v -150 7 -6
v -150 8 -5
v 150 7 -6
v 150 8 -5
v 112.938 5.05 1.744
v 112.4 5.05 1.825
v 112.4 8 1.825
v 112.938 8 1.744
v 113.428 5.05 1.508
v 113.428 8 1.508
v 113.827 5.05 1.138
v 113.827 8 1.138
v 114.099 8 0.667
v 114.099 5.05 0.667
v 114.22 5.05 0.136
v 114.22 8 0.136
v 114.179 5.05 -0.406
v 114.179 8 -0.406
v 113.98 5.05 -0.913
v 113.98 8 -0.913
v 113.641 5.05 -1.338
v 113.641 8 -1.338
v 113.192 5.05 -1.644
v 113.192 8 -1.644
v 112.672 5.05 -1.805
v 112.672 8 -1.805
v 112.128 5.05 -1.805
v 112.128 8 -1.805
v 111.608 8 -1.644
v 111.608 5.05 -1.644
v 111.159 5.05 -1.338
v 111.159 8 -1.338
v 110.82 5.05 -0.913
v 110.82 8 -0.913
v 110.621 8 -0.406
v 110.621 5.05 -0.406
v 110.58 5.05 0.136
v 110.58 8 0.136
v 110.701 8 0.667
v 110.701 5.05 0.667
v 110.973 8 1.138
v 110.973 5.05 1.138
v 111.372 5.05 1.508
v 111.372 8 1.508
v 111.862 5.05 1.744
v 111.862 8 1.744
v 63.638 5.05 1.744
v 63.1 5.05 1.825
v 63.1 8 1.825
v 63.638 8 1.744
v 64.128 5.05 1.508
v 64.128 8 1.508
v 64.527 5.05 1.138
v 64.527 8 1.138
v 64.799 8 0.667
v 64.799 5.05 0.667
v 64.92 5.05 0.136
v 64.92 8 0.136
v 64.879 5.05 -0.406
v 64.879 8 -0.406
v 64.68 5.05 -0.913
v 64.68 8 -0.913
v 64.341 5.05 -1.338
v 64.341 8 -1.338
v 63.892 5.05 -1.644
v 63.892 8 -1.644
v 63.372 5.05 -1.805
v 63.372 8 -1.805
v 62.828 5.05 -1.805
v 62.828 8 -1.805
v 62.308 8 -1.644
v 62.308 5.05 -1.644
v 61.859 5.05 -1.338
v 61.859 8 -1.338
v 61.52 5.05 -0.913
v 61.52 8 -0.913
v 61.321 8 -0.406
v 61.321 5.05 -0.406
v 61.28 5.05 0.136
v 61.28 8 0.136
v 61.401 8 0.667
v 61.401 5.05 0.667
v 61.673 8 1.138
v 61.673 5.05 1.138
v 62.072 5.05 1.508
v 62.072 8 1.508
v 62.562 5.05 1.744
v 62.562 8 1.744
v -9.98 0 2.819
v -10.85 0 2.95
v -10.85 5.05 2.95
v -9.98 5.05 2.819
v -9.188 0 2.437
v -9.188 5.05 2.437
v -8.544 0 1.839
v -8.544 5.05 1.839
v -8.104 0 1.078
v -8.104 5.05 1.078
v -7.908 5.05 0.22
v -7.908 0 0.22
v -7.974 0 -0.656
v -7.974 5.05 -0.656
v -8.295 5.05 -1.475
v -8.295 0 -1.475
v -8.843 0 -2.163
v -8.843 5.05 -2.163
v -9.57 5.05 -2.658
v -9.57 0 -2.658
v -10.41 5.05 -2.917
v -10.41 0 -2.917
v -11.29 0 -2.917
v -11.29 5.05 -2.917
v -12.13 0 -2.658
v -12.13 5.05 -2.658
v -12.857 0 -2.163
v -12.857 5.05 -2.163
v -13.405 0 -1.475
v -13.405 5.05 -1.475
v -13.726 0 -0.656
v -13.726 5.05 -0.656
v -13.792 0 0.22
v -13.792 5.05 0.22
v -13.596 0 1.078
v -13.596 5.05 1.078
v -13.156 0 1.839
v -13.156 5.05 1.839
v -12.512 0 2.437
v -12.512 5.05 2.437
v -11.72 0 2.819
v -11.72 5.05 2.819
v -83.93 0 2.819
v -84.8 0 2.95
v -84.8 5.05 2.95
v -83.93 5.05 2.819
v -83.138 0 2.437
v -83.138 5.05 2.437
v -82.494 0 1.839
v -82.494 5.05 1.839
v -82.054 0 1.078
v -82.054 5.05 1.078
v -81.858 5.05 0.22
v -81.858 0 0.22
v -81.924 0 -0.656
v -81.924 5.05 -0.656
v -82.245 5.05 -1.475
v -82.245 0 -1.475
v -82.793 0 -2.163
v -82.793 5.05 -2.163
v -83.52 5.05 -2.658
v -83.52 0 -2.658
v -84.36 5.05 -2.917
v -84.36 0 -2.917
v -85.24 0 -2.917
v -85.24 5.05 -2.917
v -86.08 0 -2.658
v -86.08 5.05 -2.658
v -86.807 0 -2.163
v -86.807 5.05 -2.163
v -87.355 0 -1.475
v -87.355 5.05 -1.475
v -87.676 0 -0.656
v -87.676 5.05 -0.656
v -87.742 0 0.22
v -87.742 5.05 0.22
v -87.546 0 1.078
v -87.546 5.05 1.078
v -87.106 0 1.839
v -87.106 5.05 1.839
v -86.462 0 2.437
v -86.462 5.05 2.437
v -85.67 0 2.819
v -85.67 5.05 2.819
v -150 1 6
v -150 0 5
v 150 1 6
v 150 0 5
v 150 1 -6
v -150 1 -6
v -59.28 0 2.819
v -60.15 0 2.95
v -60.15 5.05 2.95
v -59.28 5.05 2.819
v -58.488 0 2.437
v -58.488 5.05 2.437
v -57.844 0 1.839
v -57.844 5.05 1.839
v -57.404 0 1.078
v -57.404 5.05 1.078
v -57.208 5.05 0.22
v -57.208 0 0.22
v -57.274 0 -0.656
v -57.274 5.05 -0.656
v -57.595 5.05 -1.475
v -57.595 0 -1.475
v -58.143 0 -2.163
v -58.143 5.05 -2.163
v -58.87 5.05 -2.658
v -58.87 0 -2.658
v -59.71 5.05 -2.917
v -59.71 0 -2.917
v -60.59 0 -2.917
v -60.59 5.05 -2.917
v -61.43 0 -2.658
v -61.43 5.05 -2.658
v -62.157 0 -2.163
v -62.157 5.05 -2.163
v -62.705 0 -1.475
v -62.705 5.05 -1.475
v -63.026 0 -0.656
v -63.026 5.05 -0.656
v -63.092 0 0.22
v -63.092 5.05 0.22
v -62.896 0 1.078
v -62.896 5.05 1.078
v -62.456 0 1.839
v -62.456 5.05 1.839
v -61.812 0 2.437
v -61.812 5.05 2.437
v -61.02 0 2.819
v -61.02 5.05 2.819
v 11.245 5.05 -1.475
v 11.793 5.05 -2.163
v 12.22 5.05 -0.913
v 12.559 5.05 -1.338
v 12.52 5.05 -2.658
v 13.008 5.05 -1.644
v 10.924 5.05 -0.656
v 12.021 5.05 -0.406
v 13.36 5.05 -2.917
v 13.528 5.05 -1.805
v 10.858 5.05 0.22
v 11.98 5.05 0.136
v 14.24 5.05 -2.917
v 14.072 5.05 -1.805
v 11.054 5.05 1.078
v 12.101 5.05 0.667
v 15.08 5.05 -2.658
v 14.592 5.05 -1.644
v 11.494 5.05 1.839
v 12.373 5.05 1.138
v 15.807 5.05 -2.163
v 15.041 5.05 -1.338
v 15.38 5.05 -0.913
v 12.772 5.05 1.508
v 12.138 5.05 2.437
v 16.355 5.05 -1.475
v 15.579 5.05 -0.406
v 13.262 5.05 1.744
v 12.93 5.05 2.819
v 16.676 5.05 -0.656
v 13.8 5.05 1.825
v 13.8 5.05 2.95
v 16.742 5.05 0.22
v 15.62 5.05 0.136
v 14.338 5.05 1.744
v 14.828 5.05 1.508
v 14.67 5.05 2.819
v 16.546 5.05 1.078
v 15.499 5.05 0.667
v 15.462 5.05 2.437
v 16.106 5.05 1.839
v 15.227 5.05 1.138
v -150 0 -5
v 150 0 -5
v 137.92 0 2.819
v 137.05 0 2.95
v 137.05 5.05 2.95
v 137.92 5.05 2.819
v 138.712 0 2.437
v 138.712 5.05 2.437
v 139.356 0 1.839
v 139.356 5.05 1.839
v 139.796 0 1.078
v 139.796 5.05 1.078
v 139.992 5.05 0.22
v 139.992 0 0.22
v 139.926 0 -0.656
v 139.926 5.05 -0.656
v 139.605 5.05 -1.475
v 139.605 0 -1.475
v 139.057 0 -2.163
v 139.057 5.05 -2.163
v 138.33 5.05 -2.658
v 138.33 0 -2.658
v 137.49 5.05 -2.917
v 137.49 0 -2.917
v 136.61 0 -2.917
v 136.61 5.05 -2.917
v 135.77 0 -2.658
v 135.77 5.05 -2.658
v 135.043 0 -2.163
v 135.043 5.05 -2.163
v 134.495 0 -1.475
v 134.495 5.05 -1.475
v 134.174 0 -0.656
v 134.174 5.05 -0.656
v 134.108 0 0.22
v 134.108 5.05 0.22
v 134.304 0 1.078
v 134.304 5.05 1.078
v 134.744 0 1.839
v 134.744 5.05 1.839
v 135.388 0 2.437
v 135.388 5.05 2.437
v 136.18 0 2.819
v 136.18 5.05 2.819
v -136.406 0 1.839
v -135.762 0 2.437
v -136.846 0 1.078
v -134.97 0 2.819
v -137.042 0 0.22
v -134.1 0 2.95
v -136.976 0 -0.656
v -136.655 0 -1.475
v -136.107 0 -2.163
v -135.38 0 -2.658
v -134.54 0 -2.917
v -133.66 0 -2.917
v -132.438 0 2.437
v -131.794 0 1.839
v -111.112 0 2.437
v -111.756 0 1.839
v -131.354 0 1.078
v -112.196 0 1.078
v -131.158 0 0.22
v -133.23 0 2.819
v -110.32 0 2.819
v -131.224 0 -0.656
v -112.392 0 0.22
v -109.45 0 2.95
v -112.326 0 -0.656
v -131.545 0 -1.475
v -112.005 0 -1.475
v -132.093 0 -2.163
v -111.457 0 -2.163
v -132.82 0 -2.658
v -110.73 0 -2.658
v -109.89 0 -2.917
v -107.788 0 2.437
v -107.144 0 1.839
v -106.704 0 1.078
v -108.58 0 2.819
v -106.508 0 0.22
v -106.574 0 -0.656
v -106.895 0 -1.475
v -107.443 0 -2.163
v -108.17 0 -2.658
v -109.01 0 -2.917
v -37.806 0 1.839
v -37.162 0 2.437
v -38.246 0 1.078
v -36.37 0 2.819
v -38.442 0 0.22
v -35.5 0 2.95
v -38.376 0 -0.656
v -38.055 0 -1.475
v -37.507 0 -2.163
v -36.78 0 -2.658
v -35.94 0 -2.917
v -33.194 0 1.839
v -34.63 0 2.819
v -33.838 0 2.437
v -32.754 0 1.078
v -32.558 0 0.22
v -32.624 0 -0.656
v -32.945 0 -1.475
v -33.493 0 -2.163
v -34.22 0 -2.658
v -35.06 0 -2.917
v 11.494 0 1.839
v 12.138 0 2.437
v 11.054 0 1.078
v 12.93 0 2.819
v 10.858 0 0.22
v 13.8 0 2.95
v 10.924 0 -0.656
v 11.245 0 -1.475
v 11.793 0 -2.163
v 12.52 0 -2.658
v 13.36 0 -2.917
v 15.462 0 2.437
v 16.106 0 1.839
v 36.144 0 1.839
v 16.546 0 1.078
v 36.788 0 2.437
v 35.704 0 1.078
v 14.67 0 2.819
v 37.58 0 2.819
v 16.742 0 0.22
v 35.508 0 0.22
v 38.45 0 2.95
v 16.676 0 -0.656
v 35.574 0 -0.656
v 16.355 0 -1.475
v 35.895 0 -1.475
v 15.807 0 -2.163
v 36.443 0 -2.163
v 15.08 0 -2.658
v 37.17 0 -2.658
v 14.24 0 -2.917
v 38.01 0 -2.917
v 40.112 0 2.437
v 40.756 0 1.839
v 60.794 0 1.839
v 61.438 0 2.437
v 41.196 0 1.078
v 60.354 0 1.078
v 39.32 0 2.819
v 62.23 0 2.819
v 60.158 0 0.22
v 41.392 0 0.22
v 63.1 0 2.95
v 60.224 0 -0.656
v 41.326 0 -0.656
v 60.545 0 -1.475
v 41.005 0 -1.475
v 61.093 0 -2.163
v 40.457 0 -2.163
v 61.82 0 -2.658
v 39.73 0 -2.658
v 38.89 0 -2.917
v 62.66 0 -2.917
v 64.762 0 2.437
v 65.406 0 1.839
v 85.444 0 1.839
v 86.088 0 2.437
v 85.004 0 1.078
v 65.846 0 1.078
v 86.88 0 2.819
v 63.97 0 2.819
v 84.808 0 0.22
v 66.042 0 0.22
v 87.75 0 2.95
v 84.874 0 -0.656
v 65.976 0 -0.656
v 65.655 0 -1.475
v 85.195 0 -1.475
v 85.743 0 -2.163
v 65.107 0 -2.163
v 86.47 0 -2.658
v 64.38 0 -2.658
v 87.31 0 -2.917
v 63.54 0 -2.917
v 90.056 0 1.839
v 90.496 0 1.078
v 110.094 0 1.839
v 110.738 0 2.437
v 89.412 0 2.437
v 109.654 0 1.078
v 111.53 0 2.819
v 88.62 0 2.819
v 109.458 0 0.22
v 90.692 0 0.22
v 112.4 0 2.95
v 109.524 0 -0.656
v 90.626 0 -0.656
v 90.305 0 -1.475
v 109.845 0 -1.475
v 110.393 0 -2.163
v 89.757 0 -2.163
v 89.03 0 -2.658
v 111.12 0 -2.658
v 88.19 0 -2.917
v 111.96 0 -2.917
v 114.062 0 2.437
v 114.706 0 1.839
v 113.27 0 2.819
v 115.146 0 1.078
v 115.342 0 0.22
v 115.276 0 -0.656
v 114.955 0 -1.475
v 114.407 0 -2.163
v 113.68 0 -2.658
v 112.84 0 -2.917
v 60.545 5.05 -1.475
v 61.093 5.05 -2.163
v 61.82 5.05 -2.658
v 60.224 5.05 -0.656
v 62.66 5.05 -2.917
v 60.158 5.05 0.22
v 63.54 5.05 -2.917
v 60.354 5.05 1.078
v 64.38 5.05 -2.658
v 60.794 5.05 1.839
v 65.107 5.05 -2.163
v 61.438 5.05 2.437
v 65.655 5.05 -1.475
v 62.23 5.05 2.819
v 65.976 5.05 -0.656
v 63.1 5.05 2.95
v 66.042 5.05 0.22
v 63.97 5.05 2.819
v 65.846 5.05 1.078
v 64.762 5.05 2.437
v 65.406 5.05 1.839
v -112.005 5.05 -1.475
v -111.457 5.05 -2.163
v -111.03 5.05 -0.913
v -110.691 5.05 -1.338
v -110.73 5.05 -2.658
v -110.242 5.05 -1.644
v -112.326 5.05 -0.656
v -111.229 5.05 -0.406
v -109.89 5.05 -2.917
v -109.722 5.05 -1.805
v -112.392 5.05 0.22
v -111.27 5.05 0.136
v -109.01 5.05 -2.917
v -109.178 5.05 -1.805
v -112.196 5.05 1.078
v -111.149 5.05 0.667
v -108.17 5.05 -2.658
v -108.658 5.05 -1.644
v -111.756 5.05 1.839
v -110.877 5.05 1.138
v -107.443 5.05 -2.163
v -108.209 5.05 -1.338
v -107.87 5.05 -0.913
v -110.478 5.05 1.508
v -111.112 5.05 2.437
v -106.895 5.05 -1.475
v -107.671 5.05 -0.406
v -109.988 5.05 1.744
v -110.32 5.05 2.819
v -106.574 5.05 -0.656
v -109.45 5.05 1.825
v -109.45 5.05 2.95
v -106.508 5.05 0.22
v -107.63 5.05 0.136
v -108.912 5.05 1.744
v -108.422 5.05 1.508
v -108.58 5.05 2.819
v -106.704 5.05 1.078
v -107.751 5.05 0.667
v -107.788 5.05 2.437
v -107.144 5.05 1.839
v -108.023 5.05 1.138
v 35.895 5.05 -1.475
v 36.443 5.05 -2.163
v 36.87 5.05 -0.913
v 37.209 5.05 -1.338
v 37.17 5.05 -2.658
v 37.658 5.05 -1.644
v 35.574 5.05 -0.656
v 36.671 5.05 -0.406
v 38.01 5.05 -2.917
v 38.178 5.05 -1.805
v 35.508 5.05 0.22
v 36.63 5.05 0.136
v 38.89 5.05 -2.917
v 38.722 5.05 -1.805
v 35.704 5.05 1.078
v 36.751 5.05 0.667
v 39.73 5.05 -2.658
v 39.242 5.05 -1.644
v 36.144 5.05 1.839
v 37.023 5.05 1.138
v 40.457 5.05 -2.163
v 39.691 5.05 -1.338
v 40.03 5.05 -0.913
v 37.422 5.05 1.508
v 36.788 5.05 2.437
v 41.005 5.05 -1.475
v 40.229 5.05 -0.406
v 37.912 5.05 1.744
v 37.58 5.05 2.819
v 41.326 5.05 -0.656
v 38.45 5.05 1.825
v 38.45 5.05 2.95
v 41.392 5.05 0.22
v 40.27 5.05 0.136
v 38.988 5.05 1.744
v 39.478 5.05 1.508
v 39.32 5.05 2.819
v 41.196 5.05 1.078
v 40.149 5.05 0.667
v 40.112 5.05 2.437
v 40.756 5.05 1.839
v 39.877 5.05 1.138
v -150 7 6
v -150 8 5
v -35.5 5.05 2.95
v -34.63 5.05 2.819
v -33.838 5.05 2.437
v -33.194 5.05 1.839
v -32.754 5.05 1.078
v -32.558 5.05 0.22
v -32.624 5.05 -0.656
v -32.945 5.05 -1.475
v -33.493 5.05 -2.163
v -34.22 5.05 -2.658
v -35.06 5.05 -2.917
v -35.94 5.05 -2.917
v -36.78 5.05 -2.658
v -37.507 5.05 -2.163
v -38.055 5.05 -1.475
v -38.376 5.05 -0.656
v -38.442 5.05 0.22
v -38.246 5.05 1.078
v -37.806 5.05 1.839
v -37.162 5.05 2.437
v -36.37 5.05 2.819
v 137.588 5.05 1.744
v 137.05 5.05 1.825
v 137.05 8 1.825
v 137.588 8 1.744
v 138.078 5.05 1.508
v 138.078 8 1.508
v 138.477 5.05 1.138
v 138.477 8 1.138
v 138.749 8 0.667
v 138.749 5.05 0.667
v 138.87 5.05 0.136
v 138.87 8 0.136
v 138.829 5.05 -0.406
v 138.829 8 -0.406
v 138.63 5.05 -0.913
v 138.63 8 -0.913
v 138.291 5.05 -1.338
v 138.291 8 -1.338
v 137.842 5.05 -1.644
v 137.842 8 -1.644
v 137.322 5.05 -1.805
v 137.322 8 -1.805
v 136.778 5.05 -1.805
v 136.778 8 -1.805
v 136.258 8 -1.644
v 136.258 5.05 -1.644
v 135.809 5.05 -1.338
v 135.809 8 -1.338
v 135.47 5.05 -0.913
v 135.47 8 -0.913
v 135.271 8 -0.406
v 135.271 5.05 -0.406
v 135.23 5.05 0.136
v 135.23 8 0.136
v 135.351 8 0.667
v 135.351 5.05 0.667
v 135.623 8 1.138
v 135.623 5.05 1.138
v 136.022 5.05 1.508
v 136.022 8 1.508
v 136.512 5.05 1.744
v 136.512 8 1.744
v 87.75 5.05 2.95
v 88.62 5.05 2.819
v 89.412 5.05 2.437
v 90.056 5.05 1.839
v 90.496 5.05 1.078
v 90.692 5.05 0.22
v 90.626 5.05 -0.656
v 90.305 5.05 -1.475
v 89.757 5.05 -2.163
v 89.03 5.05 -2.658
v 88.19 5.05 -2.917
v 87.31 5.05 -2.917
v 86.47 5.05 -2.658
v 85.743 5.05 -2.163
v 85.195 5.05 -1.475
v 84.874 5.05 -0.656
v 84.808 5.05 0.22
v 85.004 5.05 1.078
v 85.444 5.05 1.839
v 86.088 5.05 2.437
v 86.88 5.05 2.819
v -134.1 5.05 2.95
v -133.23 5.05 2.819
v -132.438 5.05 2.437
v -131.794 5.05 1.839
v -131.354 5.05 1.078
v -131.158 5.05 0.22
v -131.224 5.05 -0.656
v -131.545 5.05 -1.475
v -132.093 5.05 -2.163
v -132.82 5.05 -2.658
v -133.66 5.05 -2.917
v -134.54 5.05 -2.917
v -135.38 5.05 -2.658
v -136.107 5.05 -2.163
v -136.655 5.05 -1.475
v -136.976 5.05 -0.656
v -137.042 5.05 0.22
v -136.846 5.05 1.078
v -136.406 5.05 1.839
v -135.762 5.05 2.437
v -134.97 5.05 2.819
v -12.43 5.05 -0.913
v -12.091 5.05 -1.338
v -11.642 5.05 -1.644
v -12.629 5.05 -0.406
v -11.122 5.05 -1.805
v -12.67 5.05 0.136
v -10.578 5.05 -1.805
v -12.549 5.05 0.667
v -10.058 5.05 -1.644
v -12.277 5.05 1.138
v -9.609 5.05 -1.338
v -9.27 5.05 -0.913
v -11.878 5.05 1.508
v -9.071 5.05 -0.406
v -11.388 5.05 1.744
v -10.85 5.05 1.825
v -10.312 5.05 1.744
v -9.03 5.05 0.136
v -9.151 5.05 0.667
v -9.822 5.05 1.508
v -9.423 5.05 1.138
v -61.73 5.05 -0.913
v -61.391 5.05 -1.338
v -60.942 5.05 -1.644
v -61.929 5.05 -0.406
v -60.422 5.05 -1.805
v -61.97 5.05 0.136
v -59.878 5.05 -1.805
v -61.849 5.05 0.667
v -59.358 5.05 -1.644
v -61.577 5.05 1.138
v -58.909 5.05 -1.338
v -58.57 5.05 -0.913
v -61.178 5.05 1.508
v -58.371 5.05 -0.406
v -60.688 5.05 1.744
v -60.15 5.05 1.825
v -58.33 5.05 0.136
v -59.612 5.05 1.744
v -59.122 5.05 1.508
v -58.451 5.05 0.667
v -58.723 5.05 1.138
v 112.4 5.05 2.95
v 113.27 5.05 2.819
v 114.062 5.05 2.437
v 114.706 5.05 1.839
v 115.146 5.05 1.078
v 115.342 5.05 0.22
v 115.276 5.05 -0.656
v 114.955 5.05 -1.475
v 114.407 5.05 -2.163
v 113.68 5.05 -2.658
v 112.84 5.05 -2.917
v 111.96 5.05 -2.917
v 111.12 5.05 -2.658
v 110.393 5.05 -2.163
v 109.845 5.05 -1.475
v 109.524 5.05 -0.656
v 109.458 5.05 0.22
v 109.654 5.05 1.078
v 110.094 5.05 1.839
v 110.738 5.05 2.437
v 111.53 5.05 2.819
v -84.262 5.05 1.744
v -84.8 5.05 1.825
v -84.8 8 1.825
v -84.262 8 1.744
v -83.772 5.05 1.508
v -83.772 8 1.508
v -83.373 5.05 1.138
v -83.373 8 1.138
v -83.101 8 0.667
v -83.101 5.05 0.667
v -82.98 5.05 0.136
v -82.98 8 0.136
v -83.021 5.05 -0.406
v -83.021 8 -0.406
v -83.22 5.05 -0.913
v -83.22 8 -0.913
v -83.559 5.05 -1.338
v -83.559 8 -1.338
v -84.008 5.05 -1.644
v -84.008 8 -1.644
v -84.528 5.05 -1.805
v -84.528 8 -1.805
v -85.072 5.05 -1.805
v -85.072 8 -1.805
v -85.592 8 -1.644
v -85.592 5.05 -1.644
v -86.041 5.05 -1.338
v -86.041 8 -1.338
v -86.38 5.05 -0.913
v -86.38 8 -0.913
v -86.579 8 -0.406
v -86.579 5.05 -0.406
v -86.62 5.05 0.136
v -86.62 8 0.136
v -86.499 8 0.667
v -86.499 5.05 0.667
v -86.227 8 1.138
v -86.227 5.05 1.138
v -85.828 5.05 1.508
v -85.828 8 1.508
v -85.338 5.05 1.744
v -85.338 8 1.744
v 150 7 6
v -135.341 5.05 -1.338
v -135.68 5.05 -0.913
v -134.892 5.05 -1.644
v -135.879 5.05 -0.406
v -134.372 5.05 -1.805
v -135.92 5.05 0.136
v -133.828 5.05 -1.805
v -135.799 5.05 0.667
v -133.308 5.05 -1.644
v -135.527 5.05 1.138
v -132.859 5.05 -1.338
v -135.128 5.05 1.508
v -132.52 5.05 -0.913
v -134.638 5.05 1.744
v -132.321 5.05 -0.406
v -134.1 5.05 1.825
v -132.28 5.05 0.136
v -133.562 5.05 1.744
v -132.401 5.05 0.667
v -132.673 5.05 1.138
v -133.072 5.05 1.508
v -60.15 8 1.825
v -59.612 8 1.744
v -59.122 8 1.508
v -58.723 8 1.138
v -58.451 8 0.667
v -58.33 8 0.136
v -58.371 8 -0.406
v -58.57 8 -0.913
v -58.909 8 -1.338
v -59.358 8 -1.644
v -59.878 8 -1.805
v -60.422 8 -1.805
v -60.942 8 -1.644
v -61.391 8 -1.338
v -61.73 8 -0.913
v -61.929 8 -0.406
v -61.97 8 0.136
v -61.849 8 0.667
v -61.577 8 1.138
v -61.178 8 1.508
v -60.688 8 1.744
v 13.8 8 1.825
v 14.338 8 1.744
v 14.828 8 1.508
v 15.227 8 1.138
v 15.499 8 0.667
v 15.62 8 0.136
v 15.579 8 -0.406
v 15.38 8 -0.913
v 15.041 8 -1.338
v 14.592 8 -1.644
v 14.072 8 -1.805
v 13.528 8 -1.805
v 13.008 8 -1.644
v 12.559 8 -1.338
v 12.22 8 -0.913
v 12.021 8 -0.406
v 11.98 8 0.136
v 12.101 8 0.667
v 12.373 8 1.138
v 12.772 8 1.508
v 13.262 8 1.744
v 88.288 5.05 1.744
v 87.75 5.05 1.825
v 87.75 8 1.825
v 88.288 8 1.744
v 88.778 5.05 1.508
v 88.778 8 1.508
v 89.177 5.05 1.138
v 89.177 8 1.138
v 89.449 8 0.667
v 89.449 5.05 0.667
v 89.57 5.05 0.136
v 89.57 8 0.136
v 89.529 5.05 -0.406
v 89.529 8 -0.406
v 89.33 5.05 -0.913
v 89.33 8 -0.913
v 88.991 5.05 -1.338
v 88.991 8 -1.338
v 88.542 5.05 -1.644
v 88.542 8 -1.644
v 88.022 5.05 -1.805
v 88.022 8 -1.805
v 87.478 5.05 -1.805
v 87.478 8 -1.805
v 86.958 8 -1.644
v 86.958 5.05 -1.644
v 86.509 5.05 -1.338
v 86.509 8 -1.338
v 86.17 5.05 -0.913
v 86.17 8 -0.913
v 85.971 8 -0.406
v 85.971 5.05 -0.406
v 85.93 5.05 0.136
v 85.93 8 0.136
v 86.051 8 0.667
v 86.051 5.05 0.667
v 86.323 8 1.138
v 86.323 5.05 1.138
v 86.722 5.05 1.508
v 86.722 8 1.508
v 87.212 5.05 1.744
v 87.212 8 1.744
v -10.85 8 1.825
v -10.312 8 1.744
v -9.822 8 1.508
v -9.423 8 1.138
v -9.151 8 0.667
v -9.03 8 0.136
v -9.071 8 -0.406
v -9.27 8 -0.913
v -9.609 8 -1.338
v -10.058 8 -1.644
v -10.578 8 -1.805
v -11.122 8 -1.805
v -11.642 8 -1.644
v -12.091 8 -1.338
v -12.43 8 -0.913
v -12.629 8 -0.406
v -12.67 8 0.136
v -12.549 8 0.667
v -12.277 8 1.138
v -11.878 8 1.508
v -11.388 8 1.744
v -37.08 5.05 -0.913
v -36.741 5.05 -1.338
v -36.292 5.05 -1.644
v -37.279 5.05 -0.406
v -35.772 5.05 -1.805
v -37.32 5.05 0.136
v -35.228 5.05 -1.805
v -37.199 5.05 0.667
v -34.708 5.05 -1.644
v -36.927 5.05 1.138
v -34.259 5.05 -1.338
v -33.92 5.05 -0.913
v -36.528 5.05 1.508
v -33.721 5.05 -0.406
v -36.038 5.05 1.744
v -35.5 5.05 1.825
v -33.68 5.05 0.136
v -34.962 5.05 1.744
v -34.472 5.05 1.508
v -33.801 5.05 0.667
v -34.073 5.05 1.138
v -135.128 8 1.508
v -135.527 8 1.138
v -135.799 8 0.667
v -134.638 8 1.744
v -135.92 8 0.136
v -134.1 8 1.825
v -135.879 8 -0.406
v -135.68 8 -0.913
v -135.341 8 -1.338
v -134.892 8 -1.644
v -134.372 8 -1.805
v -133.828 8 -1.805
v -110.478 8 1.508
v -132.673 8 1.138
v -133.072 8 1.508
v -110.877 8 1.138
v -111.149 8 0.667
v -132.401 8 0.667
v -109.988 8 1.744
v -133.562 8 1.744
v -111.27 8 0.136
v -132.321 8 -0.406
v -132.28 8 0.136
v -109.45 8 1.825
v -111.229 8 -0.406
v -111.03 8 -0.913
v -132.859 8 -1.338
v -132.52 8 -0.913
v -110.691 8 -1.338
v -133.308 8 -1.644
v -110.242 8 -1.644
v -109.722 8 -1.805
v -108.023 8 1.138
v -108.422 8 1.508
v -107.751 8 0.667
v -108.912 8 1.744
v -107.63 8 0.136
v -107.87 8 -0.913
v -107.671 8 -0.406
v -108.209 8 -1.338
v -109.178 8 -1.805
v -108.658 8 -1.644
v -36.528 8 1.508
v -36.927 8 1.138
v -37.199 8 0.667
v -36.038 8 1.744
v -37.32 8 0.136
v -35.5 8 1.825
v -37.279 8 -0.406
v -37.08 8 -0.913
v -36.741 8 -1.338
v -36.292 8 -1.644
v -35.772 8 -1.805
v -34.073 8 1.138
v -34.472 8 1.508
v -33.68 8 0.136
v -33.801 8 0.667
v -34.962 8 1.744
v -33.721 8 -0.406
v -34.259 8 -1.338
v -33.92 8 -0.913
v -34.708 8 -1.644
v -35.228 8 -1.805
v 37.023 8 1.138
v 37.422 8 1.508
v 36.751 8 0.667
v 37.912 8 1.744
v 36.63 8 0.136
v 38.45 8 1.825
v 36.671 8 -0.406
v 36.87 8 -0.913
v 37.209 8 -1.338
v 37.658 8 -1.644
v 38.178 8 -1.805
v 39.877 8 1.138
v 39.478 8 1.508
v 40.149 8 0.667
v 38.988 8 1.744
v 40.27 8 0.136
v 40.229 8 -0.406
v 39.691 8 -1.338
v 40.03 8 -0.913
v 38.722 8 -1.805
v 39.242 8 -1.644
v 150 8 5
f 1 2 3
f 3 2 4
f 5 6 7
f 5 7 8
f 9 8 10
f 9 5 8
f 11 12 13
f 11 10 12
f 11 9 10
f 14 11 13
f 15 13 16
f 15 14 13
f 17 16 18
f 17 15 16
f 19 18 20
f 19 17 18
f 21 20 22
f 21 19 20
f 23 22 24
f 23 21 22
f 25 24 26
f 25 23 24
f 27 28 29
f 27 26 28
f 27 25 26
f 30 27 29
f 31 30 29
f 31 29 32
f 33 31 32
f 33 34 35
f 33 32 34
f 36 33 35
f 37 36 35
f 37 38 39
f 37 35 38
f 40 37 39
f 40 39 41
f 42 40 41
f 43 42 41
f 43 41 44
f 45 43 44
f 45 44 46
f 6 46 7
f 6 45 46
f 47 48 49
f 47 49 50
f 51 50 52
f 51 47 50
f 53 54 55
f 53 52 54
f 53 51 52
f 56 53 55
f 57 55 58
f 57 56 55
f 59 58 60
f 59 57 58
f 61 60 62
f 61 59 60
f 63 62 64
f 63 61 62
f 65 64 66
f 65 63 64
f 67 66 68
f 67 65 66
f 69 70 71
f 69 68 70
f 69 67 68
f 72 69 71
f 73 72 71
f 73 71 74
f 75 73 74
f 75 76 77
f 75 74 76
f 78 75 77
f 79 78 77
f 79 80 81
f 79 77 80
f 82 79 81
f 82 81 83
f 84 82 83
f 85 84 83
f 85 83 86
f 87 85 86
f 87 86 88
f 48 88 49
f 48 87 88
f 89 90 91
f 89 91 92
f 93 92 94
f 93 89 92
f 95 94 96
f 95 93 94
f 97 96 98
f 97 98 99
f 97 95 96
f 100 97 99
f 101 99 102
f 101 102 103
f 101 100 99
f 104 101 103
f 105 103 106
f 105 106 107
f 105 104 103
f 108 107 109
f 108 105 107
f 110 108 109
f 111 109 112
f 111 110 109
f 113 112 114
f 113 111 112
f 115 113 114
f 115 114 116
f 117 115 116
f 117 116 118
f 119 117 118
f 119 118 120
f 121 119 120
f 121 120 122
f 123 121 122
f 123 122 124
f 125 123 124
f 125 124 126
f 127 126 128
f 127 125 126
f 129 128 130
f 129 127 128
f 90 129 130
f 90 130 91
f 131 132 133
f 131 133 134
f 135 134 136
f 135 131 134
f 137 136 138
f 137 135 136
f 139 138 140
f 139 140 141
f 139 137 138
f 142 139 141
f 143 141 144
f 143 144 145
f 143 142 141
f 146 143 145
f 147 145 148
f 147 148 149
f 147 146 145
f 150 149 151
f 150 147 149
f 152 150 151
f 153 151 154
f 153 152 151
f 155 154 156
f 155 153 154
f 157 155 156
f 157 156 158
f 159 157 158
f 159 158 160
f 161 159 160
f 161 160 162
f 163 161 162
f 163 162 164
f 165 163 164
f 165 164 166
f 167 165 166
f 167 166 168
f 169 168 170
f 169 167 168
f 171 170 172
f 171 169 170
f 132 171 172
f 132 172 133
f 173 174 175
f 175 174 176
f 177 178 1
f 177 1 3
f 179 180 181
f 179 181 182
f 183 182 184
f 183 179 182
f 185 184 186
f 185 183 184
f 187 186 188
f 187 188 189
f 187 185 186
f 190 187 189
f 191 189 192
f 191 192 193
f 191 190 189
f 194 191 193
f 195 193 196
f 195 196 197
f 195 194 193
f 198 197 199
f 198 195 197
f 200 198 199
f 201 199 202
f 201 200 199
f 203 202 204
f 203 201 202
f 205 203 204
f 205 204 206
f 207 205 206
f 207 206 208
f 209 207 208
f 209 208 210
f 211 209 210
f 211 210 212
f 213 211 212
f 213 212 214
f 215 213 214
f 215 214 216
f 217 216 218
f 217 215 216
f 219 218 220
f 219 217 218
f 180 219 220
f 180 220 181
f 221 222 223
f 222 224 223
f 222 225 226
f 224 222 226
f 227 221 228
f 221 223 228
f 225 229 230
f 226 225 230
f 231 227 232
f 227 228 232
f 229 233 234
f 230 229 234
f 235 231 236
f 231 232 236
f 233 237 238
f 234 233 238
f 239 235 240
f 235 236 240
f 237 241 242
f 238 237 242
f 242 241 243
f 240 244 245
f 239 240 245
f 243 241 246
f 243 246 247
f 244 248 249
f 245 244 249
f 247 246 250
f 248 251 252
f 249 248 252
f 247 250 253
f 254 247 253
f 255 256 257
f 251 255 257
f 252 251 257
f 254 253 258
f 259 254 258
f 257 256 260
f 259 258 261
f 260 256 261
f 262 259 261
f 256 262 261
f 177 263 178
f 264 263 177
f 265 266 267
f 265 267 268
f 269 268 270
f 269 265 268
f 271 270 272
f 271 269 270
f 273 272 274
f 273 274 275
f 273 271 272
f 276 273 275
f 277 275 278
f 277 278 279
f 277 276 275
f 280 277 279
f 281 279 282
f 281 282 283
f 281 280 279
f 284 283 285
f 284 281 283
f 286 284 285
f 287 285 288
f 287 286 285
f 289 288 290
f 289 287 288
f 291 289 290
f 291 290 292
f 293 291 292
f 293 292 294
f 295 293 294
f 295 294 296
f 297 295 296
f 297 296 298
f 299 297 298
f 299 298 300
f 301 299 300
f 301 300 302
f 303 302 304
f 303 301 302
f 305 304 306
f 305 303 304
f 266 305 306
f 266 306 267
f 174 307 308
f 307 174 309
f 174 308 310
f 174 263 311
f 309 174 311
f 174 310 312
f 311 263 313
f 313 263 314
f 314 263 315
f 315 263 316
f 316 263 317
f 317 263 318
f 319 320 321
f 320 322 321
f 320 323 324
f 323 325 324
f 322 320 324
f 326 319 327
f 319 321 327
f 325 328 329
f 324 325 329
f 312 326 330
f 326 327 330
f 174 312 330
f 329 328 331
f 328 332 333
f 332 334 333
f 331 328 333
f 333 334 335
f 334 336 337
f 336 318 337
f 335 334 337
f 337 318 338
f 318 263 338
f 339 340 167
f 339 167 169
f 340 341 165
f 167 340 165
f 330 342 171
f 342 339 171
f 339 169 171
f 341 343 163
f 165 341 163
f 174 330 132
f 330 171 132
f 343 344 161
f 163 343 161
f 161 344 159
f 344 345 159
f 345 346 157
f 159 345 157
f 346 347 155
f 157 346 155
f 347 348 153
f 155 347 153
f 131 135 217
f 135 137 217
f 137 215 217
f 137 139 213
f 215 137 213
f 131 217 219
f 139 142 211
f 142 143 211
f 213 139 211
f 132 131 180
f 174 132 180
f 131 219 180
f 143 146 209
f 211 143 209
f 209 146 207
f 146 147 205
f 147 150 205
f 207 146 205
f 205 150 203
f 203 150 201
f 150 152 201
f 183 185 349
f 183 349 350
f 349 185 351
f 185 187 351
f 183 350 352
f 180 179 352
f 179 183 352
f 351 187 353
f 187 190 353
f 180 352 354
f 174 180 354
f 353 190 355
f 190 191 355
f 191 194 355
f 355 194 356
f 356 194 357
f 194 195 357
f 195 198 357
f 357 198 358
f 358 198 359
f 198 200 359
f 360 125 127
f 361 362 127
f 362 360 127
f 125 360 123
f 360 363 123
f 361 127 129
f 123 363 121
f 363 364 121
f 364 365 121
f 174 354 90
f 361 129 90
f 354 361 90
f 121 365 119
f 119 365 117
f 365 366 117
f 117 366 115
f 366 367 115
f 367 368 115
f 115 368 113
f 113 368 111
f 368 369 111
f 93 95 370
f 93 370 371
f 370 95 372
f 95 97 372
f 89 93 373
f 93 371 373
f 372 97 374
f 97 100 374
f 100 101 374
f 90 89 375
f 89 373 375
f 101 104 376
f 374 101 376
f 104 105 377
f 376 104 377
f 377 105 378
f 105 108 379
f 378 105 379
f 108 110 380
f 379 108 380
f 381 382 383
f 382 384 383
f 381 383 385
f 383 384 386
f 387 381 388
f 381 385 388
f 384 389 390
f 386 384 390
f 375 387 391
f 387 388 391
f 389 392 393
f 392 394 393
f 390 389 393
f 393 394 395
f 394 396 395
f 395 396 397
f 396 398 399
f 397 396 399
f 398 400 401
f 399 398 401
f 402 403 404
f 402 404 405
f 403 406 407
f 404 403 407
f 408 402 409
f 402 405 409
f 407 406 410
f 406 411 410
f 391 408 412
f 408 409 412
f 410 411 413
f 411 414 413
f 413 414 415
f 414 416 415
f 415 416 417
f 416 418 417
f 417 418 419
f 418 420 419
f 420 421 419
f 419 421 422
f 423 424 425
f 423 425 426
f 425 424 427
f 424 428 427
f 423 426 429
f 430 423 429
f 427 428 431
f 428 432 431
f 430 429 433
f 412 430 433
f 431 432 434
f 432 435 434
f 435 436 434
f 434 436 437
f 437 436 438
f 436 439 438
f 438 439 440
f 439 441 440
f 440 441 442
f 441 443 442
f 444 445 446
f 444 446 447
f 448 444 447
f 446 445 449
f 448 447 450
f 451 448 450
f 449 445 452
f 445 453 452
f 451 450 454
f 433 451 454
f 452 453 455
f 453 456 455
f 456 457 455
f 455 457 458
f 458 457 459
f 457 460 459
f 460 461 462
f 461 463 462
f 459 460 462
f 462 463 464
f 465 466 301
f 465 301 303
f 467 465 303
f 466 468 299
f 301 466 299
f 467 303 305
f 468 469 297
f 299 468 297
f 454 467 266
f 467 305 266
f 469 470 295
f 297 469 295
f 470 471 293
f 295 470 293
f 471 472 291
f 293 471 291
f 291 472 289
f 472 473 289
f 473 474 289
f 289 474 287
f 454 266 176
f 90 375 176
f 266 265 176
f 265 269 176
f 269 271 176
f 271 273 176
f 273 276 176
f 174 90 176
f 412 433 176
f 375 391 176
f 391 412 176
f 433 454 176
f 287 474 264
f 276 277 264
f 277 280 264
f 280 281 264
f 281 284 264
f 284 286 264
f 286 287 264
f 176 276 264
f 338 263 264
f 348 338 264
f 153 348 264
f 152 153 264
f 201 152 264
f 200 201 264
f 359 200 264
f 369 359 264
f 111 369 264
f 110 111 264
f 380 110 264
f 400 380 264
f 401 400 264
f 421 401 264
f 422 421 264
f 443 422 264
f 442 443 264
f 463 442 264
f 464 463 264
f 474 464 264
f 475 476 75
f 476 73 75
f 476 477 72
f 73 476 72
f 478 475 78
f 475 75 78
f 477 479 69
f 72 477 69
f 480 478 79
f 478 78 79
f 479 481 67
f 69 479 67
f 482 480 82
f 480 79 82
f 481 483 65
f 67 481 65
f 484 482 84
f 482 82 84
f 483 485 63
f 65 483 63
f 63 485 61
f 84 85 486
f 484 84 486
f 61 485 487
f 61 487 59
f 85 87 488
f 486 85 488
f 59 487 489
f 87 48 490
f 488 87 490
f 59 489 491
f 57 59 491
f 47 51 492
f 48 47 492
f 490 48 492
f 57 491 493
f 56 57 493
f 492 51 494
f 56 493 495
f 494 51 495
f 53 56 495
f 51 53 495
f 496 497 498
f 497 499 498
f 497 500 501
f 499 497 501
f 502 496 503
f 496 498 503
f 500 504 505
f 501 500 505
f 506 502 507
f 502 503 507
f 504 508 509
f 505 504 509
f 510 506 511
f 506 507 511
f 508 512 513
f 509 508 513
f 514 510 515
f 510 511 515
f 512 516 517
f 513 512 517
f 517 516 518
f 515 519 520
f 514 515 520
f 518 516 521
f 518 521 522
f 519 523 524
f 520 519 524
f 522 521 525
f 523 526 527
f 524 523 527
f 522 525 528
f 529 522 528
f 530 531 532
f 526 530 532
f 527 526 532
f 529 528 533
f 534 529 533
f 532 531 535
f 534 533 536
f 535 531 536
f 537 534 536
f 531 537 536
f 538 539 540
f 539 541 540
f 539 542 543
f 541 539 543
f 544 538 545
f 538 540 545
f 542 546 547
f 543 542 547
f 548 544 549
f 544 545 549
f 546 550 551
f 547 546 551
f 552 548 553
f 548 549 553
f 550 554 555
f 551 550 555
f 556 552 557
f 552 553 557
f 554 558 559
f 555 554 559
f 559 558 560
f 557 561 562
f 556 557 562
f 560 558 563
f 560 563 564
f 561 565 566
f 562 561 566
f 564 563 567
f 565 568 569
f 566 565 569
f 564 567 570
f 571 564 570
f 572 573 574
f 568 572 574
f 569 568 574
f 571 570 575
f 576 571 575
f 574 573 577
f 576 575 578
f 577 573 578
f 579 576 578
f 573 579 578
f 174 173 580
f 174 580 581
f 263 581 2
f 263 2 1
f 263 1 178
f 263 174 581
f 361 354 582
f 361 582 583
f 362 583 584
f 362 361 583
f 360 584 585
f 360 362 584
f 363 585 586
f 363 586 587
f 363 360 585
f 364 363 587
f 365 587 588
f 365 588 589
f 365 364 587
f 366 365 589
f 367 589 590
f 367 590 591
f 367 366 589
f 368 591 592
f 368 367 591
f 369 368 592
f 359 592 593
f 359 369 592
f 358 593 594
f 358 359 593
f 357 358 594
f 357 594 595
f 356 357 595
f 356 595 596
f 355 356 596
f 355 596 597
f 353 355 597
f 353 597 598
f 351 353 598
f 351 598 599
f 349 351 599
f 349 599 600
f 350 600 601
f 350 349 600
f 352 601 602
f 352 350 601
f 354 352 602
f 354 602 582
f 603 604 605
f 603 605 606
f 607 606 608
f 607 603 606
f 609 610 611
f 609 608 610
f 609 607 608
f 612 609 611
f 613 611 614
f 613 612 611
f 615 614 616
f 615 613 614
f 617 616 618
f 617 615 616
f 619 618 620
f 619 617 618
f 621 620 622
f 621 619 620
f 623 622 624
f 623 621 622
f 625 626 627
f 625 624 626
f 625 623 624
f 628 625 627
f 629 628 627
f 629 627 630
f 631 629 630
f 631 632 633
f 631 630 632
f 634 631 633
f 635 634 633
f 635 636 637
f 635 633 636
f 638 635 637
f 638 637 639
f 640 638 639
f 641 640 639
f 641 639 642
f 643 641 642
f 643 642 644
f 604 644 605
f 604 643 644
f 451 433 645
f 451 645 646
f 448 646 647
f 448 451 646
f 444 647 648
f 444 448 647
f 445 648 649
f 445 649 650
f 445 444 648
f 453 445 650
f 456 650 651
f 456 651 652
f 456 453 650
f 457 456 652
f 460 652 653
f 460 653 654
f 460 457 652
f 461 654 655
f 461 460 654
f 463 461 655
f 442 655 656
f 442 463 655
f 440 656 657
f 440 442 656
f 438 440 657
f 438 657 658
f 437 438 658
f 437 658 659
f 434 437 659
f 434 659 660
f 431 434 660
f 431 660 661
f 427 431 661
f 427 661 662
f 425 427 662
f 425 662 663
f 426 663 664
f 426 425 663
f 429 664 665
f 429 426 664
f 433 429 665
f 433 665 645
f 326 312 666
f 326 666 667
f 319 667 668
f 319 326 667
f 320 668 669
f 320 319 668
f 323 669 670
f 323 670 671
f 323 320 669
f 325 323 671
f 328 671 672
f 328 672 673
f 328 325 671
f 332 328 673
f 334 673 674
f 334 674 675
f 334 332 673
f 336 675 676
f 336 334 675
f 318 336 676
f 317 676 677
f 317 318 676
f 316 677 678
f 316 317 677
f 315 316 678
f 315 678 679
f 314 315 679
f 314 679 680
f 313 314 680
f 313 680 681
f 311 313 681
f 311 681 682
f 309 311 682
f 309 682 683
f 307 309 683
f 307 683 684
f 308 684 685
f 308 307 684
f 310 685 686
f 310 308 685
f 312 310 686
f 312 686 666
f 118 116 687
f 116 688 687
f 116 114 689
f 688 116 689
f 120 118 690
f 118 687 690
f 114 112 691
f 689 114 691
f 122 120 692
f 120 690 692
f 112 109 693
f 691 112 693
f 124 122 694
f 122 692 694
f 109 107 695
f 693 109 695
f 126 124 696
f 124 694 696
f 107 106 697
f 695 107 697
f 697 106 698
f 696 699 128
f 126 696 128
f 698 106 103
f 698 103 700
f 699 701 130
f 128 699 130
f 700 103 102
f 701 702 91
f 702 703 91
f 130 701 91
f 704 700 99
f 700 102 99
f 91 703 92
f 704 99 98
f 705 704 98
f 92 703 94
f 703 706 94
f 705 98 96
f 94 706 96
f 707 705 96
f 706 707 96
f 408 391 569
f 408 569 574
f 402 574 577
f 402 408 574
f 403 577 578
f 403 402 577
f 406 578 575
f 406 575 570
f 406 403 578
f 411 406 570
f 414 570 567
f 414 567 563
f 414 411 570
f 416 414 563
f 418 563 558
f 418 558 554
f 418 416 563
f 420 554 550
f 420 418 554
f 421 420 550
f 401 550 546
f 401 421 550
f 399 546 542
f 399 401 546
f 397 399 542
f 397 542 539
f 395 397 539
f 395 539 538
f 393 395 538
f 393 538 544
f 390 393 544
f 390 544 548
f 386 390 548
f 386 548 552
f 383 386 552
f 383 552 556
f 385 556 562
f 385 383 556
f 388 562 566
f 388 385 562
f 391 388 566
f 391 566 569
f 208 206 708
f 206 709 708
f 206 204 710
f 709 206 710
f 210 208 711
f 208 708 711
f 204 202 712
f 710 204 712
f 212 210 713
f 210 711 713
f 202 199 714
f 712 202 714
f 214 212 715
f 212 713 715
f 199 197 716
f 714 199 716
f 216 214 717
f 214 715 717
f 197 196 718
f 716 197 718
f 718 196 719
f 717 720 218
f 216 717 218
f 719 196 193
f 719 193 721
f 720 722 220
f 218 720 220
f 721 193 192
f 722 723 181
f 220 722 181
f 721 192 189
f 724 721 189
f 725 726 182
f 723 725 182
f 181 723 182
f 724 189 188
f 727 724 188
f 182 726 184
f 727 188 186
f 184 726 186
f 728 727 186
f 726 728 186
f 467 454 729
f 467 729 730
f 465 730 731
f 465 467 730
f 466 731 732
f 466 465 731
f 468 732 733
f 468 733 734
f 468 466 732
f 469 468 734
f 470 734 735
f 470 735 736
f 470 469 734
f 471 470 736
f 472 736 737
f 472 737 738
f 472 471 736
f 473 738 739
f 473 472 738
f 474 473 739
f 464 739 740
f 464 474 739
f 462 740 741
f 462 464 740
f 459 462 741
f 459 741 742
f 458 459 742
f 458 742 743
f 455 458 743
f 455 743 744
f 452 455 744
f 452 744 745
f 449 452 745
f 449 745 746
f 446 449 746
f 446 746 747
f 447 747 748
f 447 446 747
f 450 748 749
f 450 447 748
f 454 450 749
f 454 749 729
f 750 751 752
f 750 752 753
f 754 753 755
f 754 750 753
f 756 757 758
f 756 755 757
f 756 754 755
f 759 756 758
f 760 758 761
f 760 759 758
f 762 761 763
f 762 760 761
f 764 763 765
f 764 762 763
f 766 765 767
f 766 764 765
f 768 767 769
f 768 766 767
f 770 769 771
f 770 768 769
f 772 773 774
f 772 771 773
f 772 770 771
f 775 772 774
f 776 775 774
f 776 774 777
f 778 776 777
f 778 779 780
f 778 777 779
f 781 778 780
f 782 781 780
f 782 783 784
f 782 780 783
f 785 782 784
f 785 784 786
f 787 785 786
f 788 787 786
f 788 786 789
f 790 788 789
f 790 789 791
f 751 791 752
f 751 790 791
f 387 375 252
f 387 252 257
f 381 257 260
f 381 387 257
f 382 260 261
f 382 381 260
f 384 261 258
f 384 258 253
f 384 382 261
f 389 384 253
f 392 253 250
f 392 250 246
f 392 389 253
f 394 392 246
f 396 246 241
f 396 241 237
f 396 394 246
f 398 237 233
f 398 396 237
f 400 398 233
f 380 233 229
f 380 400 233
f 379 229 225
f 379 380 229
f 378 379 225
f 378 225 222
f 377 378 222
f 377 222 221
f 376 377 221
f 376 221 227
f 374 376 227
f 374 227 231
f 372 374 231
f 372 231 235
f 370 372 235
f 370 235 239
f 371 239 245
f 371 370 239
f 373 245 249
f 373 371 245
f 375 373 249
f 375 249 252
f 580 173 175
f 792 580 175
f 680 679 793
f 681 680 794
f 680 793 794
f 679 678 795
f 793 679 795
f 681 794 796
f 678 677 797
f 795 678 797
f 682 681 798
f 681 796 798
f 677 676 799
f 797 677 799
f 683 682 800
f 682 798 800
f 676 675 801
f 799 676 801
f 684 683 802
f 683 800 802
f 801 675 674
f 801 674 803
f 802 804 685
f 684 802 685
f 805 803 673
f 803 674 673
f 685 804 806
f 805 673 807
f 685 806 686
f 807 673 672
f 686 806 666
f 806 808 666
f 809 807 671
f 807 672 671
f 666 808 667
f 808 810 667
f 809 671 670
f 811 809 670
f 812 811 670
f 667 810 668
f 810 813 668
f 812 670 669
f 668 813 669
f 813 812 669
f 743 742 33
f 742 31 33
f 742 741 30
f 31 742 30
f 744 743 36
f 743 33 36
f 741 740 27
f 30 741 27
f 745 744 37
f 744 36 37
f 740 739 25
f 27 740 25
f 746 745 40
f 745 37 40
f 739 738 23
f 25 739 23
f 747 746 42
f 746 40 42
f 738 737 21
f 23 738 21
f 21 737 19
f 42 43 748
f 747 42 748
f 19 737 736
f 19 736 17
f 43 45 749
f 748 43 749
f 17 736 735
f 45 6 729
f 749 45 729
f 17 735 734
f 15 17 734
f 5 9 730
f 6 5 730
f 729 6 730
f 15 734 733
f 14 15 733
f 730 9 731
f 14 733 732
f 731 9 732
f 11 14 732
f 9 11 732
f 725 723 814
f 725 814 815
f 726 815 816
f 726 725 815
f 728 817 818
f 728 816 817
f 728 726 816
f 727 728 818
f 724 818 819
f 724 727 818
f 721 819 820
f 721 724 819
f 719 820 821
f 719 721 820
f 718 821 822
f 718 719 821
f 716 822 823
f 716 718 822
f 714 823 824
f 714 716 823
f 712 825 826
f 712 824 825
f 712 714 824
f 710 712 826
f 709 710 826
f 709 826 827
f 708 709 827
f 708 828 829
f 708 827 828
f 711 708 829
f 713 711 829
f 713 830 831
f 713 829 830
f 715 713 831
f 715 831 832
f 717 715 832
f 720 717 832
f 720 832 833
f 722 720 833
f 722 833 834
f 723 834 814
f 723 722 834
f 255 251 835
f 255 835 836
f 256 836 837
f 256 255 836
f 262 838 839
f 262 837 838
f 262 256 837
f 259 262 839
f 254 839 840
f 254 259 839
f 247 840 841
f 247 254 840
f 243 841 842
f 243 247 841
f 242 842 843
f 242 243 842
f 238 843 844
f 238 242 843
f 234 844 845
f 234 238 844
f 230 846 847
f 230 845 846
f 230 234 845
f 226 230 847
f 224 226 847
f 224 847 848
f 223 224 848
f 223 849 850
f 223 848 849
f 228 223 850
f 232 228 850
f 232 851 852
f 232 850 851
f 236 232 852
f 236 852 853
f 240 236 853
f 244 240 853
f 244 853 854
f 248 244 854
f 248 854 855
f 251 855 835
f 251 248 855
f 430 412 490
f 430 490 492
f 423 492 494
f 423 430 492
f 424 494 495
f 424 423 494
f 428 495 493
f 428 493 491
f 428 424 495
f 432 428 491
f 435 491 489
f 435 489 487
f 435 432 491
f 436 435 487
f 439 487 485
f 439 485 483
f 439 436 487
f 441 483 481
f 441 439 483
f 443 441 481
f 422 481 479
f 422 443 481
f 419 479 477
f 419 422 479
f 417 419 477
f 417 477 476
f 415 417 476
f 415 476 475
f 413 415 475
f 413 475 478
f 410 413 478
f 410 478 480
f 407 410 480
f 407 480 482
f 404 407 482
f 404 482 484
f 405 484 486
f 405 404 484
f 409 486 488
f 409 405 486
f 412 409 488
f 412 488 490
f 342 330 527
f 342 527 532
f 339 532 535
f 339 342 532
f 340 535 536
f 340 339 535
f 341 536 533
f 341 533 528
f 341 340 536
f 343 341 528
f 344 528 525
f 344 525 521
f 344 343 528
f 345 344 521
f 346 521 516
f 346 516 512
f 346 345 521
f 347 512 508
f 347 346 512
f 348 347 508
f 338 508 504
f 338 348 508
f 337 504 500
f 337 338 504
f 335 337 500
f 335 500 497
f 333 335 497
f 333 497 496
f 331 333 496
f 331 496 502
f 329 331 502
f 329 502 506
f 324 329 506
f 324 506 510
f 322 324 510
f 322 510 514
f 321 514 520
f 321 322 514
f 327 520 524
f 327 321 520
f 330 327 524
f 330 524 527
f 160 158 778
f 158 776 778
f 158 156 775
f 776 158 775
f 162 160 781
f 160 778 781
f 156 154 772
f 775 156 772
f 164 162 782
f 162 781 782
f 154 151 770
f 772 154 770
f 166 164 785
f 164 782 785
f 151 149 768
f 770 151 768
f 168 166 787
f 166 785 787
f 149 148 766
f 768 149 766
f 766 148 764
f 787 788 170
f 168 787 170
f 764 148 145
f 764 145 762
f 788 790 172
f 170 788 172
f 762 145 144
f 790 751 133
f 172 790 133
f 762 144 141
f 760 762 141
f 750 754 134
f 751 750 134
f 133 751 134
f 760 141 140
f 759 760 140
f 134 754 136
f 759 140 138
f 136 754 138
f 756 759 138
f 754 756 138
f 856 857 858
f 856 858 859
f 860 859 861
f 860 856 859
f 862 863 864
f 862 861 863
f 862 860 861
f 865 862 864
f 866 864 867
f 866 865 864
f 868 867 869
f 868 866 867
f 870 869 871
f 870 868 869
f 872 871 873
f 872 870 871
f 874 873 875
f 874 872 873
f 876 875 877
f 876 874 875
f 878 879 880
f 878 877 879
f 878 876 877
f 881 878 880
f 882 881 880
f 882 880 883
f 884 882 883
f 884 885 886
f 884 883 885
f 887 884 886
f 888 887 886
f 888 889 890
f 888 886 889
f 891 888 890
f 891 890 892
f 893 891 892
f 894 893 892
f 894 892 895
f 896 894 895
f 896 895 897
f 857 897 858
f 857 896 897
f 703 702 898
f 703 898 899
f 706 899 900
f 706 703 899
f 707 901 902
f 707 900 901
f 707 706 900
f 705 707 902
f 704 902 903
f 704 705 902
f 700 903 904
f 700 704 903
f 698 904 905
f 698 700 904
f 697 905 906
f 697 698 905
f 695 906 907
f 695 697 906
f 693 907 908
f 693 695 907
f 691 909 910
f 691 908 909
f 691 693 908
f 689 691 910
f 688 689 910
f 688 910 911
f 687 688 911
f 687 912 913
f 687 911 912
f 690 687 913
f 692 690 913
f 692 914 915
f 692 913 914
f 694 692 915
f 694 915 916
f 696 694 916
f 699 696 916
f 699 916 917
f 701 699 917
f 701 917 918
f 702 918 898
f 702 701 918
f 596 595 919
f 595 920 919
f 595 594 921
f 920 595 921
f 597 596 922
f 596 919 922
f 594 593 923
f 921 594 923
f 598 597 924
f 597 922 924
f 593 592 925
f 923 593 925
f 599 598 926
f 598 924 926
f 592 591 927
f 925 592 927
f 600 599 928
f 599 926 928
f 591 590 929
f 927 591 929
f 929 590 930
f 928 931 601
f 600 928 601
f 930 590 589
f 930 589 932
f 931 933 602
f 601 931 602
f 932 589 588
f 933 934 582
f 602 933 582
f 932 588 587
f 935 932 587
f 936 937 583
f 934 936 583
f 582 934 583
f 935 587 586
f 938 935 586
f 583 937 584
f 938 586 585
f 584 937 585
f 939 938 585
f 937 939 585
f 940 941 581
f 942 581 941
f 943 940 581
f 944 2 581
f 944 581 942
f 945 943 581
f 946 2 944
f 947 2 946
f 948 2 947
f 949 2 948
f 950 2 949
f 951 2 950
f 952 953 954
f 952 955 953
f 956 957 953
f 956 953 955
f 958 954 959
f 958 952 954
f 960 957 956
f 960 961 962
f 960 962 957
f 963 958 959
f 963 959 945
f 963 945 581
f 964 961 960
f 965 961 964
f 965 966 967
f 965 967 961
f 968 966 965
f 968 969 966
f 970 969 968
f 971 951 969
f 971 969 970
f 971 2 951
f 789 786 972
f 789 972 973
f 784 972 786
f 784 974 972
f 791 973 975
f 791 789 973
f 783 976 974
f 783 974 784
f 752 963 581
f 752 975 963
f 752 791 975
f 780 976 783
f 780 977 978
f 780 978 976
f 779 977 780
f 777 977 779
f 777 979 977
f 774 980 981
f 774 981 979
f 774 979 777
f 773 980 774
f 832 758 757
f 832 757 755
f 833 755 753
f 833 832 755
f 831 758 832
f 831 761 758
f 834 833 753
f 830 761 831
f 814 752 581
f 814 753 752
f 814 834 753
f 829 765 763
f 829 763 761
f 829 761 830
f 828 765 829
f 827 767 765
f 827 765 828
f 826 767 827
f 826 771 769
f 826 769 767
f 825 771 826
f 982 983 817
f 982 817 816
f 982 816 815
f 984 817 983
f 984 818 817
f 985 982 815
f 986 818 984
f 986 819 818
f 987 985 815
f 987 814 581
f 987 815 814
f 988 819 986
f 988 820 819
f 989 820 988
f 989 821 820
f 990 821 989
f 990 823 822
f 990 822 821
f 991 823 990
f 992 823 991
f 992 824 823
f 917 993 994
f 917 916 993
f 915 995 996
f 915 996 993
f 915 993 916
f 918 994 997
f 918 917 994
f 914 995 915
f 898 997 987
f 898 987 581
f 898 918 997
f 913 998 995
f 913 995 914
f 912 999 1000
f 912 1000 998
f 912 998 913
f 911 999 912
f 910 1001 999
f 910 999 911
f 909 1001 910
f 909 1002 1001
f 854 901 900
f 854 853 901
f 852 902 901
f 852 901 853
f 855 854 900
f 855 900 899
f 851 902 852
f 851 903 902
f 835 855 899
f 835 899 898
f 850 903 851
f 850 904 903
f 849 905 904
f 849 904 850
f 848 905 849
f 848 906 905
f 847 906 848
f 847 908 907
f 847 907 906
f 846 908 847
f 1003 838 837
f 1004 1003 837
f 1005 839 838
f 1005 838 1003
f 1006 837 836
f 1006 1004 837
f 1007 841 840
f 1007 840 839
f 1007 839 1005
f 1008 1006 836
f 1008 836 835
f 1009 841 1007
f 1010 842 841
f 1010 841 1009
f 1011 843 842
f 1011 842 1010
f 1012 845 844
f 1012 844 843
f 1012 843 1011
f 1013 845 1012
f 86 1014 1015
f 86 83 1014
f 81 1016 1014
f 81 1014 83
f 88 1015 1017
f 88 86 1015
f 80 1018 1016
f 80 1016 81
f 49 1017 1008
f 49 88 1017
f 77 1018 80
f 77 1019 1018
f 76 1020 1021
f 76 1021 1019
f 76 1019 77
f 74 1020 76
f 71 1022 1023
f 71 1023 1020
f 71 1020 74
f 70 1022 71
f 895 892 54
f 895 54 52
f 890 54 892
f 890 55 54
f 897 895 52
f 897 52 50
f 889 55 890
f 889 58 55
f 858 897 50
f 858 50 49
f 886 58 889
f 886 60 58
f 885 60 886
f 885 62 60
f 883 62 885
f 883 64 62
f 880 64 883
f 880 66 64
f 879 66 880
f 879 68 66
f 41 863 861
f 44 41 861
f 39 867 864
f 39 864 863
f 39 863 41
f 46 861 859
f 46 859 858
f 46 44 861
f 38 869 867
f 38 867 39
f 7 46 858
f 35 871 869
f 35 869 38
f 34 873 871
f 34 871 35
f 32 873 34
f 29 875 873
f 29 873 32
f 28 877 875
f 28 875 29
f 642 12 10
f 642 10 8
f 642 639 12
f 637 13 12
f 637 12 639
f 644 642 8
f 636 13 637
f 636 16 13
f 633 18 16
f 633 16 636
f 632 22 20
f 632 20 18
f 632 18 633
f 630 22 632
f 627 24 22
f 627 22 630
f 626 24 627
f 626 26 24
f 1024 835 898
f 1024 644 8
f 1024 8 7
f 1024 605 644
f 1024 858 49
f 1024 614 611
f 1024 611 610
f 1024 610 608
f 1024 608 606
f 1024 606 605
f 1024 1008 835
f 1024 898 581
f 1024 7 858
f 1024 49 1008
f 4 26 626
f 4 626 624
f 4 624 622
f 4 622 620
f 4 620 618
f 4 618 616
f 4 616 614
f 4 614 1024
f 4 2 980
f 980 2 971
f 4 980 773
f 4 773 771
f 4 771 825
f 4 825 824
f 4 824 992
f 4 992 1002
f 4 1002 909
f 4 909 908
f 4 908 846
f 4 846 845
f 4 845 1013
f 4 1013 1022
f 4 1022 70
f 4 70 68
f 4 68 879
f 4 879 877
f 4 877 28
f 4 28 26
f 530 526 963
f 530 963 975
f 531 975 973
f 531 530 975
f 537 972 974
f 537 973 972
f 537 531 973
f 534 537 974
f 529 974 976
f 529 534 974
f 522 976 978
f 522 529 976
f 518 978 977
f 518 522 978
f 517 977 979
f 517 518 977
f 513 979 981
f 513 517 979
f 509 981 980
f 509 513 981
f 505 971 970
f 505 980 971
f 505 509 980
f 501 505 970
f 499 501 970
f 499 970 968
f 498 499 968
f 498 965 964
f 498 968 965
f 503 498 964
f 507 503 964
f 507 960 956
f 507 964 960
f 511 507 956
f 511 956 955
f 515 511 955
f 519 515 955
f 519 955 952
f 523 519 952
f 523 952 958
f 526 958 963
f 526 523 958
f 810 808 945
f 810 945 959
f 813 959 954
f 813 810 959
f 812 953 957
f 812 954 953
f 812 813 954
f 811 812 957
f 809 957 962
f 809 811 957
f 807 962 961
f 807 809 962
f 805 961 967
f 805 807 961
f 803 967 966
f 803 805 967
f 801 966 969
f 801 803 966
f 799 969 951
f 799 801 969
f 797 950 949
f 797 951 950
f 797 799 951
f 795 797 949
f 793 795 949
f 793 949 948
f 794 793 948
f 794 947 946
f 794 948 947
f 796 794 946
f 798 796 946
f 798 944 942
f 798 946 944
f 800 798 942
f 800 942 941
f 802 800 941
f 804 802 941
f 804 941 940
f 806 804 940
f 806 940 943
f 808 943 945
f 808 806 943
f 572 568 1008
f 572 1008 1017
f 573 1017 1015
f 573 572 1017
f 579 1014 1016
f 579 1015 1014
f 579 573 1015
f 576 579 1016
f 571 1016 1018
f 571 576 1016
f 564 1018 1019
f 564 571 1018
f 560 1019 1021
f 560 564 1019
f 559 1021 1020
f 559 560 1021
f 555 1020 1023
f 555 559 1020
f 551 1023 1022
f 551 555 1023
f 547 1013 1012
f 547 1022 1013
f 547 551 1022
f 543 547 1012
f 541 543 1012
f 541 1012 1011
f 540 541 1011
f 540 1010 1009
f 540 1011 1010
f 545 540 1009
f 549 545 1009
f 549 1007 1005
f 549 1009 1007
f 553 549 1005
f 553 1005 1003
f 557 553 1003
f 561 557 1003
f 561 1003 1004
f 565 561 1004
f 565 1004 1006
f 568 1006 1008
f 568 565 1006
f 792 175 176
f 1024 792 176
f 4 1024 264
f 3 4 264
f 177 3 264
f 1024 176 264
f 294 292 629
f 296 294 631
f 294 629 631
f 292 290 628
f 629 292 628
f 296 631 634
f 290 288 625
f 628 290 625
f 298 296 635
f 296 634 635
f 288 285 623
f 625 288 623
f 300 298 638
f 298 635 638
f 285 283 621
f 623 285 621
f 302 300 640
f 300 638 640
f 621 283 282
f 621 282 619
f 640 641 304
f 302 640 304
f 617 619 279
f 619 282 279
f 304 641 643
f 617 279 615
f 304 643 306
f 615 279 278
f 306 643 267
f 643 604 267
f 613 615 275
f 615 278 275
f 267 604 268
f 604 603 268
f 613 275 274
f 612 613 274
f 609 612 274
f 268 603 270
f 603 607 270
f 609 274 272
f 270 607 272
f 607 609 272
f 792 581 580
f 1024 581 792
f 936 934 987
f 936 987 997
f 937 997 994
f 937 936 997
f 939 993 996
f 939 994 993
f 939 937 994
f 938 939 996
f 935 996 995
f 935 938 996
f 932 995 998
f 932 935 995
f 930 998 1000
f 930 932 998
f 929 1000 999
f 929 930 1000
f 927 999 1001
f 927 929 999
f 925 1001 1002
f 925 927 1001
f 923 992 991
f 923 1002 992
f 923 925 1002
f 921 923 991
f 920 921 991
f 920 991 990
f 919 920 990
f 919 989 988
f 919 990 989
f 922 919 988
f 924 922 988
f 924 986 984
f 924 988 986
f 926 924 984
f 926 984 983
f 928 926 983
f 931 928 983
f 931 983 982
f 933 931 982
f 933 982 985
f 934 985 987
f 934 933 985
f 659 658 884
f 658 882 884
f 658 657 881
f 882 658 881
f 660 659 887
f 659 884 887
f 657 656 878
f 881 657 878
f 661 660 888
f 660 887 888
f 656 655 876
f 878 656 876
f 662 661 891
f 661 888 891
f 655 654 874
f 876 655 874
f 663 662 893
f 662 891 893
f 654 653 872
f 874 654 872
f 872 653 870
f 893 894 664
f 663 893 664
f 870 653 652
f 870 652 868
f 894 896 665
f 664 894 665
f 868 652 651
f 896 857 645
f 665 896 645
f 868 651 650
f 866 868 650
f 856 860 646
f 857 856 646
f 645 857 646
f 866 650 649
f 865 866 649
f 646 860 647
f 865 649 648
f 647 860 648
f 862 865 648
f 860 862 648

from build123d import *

# Parameters (mm, degrees)
SKETCH1_W           = 300
SKETCH1_H           = 12
BOSS_EXTRUDE1_DEPTH = 8
CHAMFER1_SIZE       = 1
SKETCH2_R           = 2.95
CUT_EXTRUDE1_DEPTH  = 5.05
SKETCH3_R           = 1.825
CUT_EXTRUDE2_DEPTH  = 151.332963784
LPATTERN2_COUNT     = 12
LPATTERN2_PITCH     = 24.65


with BuildPart() as part:
    # Sketch1 → Boss-Extrude1 (new body)
    with BuildSketch(Plane(origin=(0, 0, 0), x_dir=(1, 0, 0), z_dir=(0, 1, 0))):
        Rectangle(SKETCH1_W, SKETCH1_H)
    extrude(amount=BOSS_EXTRUDE1_DEPTH)

    # Chamfer1
    chamfer1_edges = [part.edges().sort_by_distance(p)[0] for p in [
        (0, 8, -6),
        (0, 0, -6),
        (0, 0, 6),
        (0, 8, 6),
    ]]
    chamfer(chamfer1_edges, length=CHAMFER1_SIZE)

    # Sketch2 → Cut-Extrude1 (cut)
    with BuildSketch(Plane(origin=(0, 0, 0), x_dir=(1, 0, 0), z_dir=(0, 1, 0))):
        with Locations(Location((137.05, 0, 0), (0, 0, 270))):
            Circle(SKETCH2_R)
    cut_extrude1 = extrude(amount=CUT_EXTRUDE1_DEPTH, mode=Mode.SUBTRACT)

    # Sketch3 → Cut-Extrude2 (cut, through all)
    with BuildSketch(Plane(origin=(0, 0, 0), x_dir=(1, 0, 0), z_dir=(0, 1, 0))):
        with Locations(Location((137.05, 0, 0), (0, 0, 270))):
            Circle(SKETCH3_R)
    cut_extrude2 = extrude(amount=CUT_EXTRUDE2_DEPTH, mode=Mode.SUBTRACT)

    # LPattern2: Cut-Extrude1, Cut-Extrude2 ×12
    with Locations(*[(-i * LPATTERN2_PITCH, 0, 0) for i in range(1, LPATTERN2_COUNT)]):
        add(cut_extrude1, mode=Mode.SUBTRACT)
        add(cut_extrude2, mode=Mode.SUBTRACT)


solid = part.part
